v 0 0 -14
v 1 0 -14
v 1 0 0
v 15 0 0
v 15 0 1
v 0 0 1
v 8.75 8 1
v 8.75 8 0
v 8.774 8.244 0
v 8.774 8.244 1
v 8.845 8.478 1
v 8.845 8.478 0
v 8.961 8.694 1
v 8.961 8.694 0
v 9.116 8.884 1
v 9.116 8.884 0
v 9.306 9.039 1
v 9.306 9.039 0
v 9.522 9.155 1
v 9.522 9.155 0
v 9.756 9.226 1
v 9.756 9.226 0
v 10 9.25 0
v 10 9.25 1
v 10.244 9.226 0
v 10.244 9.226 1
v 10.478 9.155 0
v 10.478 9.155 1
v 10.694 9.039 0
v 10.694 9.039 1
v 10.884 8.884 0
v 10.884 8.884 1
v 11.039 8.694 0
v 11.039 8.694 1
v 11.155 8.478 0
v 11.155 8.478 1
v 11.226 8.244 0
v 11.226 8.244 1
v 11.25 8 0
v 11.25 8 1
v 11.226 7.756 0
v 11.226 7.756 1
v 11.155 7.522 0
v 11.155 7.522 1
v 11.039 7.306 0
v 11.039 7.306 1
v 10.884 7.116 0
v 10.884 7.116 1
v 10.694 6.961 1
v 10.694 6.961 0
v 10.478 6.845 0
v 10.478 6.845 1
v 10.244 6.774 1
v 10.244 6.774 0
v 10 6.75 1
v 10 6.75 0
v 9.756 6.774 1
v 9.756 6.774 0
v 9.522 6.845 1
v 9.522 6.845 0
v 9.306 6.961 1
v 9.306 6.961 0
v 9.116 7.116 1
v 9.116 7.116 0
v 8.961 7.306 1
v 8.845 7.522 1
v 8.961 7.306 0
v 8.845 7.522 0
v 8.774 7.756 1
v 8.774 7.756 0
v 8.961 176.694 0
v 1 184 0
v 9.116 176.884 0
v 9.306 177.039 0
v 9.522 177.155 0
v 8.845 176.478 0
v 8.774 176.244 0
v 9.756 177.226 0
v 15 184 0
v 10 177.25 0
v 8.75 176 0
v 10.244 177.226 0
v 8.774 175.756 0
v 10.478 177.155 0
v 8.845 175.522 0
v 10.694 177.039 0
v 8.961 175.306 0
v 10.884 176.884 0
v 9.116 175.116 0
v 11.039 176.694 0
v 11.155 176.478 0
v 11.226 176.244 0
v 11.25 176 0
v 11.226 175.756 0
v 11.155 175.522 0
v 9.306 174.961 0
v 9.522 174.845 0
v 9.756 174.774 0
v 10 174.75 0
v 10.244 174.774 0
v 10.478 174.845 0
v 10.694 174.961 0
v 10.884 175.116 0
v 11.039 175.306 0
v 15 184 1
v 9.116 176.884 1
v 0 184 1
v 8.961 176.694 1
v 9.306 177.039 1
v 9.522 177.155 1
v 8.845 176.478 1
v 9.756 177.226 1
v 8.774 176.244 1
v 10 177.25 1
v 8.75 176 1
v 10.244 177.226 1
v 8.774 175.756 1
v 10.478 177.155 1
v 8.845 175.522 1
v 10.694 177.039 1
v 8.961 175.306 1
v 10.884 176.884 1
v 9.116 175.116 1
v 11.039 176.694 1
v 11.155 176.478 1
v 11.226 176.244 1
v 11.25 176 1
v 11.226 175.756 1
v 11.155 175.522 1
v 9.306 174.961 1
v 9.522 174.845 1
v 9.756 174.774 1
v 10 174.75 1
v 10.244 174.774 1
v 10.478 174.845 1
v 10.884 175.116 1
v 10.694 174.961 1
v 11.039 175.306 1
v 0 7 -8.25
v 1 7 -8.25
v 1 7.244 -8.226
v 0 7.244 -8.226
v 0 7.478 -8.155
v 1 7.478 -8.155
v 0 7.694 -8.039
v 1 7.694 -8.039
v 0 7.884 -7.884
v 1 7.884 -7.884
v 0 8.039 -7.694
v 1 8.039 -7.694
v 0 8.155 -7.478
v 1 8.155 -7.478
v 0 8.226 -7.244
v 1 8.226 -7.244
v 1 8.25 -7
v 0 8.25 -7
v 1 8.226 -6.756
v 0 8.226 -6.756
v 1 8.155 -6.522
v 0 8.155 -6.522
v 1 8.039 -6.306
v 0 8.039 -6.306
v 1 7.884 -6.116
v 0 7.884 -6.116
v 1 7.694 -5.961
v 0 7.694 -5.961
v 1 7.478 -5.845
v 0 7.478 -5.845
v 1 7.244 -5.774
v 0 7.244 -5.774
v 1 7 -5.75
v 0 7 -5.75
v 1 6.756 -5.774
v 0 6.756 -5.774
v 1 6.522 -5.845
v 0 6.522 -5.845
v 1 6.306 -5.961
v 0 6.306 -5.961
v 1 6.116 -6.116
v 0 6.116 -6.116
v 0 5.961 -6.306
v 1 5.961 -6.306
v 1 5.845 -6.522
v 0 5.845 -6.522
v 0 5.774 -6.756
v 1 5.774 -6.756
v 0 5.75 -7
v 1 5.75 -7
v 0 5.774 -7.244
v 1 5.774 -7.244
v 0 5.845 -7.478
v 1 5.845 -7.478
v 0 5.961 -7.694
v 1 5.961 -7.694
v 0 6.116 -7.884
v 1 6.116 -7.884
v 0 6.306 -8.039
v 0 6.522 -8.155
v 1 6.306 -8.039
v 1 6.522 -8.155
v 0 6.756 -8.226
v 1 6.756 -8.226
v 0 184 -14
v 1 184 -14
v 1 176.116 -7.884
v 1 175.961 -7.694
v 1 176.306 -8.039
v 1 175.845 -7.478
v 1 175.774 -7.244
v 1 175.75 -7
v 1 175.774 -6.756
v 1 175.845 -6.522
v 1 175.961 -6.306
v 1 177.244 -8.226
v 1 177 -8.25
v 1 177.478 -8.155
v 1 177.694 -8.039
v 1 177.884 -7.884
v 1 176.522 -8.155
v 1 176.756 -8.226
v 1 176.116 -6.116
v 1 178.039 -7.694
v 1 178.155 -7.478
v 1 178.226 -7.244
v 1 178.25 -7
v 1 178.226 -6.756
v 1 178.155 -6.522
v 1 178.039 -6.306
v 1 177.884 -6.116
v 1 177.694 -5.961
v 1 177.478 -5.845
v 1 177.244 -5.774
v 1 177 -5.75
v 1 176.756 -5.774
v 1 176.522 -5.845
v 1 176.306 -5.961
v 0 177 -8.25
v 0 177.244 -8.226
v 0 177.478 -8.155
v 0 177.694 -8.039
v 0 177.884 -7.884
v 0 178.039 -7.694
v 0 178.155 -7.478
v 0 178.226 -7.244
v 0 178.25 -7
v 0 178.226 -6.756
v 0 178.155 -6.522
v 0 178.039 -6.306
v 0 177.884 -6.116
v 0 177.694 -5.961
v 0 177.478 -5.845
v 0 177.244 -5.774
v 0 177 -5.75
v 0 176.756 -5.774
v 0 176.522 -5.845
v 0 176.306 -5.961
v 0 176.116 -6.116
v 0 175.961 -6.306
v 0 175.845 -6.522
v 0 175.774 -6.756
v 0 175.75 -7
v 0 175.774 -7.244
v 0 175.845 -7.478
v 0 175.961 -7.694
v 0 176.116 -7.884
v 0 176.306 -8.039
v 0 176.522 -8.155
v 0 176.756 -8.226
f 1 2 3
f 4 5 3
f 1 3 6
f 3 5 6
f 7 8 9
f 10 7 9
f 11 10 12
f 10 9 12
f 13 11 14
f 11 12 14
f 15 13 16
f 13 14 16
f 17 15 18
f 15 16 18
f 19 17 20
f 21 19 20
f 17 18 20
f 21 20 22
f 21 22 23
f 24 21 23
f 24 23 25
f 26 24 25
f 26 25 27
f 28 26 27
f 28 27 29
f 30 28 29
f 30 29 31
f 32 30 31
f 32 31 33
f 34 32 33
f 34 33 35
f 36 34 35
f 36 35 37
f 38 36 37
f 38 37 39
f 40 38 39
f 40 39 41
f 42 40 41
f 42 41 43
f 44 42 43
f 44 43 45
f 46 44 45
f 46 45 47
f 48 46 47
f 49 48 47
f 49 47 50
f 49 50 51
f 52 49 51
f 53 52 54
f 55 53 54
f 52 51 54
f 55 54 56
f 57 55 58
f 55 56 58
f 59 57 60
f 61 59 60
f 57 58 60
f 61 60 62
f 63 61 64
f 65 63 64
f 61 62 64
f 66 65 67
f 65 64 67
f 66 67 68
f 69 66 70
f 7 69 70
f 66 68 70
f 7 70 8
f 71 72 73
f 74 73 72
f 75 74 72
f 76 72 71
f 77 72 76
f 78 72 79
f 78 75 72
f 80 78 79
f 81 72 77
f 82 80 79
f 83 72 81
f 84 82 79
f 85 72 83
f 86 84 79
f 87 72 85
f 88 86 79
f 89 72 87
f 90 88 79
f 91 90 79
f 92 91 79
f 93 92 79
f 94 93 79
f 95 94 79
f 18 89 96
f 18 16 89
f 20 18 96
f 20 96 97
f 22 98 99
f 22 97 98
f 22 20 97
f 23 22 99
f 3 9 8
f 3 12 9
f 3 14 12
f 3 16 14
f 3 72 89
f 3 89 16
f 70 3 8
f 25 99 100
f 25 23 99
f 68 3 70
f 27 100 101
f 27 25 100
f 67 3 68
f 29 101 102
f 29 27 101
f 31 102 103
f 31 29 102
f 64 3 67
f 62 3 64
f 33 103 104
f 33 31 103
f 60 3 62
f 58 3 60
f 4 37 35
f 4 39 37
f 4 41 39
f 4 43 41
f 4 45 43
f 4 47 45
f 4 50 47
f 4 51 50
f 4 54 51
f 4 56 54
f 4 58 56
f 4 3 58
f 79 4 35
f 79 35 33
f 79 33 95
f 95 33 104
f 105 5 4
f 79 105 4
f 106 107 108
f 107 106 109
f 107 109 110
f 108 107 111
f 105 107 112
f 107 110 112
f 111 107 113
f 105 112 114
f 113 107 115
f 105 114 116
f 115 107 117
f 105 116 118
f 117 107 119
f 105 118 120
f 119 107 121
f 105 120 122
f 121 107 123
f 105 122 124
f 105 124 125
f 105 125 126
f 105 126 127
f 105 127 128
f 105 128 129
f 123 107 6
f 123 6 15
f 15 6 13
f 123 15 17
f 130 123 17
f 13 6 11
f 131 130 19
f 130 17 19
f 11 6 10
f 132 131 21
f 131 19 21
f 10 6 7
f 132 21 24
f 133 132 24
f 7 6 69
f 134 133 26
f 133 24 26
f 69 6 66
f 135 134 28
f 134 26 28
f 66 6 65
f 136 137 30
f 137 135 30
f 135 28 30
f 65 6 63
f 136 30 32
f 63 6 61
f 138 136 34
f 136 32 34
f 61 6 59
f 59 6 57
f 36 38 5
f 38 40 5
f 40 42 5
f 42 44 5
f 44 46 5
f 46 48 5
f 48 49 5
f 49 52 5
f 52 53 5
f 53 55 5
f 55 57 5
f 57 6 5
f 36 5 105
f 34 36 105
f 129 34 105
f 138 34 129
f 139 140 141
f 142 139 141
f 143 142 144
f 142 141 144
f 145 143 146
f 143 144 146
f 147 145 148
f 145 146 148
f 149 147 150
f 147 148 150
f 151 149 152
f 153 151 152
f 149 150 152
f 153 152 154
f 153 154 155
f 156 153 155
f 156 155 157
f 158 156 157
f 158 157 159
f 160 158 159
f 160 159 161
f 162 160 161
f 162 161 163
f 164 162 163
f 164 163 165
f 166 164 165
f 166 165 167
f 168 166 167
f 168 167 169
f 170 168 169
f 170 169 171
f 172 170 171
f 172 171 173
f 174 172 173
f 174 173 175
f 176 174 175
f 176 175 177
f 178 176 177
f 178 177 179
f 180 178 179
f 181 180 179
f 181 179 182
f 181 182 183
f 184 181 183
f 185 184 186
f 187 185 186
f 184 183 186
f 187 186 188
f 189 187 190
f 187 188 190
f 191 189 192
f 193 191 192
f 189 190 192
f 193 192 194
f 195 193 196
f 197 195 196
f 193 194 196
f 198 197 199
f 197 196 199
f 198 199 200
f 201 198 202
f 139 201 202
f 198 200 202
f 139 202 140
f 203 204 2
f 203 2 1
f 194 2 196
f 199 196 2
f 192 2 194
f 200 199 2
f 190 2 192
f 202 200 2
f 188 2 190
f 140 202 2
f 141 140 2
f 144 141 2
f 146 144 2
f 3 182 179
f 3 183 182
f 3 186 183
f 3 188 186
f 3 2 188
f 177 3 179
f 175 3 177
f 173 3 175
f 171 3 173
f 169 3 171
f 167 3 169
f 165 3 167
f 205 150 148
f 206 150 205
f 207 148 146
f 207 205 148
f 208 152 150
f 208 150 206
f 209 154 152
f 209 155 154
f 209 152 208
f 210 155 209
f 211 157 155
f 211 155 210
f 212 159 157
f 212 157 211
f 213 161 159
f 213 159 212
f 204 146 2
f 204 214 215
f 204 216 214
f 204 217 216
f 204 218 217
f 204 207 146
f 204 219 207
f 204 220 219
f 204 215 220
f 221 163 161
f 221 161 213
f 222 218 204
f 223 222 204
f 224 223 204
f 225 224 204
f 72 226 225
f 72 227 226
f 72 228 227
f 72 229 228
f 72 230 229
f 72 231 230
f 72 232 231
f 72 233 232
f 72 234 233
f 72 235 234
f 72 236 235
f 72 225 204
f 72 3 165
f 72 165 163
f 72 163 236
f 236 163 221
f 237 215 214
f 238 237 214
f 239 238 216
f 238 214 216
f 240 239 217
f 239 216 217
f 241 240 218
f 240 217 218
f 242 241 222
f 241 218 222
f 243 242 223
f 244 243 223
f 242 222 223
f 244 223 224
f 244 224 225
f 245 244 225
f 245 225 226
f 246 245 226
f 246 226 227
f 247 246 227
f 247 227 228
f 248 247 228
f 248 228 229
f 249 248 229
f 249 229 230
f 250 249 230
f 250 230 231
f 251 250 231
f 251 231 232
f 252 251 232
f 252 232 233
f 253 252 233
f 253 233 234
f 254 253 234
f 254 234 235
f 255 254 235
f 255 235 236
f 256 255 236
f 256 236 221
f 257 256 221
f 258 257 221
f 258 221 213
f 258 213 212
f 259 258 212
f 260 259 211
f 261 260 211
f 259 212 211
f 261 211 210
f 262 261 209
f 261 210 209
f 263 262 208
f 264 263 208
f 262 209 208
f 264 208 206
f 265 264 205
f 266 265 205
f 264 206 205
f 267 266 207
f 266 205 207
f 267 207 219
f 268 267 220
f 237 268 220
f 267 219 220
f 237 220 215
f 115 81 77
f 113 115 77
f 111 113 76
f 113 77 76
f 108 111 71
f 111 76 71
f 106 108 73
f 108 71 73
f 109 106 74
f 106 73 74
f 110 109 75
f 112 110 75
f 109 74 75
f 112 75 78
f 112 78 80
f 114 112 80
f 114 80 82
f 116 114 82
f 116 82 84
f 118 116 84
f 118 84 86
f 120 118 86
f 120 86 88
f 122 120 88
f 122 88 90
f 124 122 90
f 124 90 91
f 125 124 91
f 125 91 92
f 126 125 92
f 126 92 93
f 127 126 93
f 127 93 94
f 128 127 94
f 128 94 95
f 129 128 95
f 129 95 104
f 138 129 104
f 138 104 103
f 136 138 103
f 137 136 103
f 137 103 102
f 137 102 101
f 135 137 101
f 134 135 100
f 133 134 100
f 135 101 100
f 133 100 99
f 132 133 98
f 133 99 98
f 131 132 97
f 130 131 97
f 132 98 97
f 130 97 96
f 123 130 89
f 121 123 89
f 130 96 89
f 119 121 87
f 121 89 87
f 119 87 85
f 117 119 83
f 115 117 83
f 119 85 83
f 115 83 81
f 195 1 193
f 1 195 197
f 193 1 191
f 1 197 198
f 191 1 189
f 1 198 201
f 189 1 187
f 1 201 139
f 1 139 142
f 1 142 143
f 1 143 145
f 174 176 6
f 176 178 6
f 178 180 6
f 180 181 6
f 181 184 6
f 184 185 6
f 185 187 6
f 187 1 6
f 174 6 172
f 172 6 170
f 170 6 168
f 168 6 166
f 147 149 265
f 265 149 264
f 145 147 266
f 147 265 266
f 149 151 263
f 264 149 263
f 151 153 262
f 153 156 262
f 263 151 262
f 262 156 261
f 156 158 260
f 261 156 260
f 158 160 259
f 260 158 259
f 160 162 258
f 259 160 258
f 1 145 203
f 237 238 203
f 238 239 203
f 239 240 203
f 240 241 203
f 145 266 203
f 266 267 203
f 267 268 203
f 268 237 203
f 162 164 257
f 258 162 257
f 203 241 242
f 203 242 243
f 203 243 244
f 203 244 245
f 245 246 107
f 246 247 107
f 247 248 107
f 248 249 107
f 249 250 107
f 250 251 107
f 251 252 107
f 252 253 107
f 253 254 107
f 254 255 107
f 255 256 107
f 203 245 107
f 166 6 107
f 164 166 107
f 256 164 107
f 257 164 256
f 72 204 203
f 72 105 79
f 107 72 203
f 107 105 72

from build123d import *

# Parameters (mm, degrees)
SKETCH_1_W      = 15
SKETCH_1_H      = 1
EXTRUDE_1_DEPTH = 184
SKETCH_3_W      = 1
SKETCH_3_H      = 184
EXTRUDE_2_DEPTH = 14
M3X0_5_1_D      = 2.5
M3X0_5_2_D      = 2.5


with BuildPart() as part:
    # ｽｹｯﾁ1 → ﾎﾞｽ - 押し出し1 (new body)
    with BuildSketch(Plane(origin=(0, 0, 0), x_dir=(1, 0, 0), z_dir=(0, 1, 0))):
        with Locations((7.5, -0.5)):
            Rectangle(SKETCH_1_W, SKETCH_1_H)
    extrude(amount=EXTRUDE_1_DEPTH)

    # ｽｹｯﾁ3 → ﾎﾞｽ - 押し出し2 (add)
    with BuildSketch(Plane(origin=(0, 0, 0), x_dir=(-1, 0, 0), z_dir=(0, 0, -1))):
        with Locations((-0.5, 92)):
            Rectangle(SKETCH_3_W, SKETCH_3_H)
    extrude(amount=EXTRUDE_2_DEPTH)

    # M3x0.5 ねじ穴1 (through all)
    with Locations(Plane.ZY):
        with Locations((-7, 7), (-7, 177)):
            Hole(M3X0_5_1_D / 2)

    # M3x0.5 ねじ穴2 (through all)
    with Locations(Plane.XY.offset(1)):
        with Locations((10, 8), (10, 176)):
            Hole(M3X0_5_2_D / 2)


solid = part.part
